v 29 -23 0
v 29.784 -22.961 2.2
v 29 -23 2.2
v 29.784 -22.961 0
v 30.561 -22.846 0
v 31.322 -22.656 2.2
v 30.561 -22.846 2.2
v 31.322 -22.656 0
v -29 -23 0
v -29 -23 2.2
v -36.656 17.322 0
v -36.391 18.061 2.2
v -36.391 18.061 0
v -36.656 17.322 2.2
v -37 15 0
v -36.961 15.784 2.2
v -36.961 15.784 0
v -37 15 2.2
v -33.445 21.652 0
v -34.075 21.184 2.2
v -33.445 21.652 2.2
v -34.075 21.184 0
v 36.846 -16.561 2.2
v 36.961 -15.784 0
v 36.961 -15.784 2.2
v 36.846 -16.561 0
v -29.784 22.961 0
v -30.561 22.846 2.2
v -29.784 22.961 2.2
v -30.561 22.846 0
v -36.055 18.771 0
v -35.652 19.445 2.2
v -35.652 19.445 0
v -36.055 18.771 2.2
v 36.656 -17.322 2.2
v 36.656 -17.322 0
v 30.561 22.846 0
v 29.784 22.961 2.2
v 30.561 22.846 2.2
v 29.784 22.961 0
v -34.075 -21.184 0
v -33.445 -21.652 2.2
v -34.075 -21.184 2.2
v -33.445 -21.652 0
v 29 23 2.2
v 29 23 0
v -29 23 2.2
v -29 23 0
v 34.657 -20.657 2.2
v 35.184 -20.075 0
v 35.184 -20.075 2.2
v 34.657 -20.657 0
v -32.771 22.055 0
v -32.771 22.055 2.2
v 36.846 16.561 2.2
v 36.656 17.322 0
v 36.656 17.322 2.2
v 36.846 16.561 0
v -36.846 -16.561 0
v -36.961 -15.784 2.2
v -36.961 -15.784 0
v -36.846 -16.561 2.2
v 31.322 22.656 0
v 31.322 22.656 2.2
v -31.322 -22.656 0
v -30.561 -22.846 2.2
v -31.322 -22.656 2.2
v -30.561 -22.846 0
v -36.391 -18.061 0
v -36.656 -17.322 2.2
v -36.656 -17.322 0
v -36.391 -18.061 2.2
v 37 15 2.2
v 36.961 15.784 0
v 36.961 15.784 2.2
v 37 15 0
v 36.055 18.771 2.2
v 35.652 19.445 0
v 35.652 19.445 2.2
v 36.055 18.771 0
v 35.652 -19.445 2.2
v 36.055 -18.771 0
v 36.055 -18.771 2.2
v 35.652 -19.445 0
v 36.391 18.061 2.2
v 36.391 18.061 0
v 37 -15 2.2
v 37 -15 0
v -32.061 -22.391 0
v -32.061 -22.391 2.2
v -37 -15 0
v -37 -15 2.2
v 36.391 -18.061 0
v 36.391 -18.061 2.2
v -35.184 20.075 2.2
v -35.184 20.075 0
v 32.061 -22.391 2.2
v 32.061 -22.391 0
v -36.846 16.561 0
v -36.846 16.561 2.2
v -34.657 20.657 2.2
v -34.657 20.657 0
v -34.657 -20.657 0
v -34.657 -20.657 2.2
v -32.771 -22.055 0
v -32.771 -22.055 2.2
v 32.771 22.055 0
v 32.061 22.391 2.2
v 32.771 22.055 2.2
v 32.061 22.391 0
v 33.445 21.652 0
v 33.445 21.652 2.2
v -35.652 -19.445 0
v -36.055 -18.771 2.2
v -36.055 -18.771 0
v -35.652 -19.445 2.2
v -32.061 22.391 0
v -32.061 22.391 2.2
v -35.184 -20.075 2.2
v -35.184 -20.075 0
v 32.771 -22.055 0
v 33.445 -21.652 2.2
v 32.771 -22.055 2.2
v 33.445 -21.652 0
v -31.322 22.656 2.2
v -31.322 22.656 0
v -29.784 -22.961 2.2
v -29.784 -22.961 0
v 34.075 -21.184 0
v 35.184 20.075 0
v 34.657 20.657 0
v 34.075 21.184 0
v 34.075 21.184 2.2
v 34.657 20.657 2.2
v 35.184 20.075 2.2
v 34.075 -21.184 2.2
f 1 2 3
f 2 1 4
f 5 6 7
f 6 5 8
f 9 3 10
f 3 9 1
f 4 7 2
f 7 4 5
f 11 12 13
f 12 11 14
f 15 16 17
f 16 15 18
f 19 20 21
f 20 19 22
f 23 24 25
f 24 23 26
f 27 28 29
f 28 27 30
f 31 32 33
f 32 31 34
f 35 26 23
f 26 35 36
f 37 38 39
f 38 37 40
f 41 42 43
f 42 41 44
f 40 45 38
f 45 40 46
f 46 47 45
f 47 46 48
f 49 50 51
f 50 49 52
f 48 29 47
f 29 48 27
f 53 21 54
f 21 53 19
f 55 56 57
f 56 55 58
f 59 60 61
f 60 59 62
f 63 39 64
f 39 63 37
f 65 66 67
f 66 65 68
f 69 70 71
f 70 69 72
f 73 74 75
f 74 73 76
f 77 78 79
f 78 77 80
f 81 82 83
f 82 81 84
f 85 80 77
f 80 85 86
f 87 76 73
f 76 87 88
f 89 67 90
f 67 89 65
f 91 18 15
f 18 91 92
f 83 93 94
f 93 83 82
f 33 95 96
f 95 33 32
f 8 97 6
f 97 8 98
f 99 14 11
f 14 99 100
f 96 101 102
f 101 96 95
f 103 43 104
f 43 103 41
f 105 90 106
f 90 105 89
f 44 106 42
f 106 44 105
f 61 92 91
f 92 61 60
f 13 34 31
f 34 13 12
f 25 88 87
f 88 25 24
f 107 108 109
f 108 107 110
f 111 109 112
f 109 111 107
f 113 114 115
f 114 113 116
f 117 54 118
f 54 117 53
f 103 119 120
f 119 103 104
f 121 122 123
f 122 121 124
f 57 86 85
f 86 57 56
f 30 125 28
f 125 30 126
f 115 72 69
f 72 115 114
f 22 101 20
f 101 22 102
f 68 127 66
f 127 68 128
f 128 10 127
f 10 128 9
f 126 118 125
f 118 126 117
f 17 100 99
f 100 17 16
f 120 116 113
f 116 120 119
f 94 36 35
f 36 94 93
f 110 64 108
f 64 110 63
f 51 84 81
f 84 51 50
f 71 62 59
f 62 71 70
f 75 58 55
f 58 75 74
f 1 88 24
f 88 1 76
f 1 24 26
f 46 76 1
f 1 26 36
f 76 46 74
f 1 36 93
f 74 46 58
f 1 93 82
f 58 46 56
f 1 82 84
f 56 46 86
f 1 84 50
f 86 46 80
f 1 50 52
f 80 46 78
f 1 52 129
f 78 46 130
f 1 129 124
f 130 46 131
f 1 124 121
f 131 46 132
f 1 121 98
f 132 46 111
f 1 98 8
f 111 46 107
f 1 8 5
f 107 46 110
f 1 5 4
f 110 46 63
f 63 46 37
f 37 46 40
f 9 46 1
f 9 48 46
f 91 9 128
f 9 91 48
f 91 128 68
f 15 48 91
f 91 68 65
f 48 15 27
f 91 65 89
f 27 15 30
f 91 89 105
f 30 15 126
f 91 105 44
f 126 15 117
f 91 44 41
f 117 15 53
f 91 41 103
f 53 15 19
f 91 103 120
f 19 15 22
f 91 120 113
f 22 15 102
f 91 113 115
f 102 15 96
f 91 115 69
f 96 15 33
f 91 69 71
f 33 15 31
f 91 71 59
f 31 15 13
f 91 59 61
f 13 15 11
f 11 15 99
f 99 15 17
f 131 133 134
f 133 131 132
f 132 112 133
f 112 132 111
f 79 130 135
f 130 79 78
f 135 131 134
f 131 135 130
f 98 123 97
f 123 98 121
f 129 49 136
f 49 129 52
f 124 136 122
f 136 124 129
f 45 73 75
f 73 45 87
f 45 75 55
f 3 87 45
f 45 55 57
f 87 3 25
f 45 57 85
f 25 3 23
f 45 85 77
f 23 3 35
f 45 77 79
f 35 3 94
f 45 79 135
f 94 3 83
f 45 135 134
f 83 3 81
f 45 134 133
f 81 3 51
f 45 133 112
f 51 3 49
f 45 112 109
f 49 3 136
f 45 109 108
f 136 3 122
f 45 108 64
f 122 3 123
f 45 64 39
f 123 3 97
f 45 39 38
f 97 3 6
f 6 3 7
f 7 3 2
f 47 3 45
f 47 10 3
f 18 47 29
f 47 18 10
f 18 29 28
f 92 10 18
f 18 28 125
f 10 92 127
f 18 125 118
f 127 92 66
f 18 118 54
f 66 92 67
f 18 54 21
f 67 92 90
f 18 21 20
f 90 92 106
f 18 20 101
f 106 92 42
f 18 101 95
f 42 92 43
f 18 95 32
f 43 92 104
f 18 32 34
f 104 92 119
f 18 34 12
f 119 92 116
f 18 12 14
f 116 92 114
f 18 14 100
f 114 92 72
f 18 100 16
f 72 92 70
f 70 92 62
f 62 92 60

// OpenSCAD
// Stackable-looking parts bin in the OpenSCAD customizer style.
// One rounded plan, a hollow, and a finger scoop: constructive solid geometry
// a maker can retune from the parameter list and send to a printer.

// Outside length
length = 90;
// Outside width
width = 62;
// Outside height
height = 40;
// Wall thickness
wall = 2.4;
// Floor thickness
floor_thickness = 2.2;
// Corner radius
corner_radius = 8;
// Finger-scoop radius on the front lip
scoop_radius = 7;

$fn = 64;

module rounded_rect(rect_length, rect_width, radius) {
  offset(r = radius)
    offset(delta = -radius)
      square([rect_length - 2 * radius, rect_width - 2 * radius], center = true);
}

module parts_bin() {
  inner_radius = max(corner_radius - wall, 0.8);
  difference() {
    linear_extrude(height)
      rounded_rect(length, width, corner_radius);
    translate([0, 0, floor_thickness])
      linear_extrude(height)
        rounded_rect(length - 2 * wall, width - 2 * wall, inner_radius);
    translate([0, -width / 2 + wall, height])
      rotate([0, 90, 0])
        cylinder(h = length * 0.46, r = scoop_radius, center = true);
  }
}

parts_bin();
